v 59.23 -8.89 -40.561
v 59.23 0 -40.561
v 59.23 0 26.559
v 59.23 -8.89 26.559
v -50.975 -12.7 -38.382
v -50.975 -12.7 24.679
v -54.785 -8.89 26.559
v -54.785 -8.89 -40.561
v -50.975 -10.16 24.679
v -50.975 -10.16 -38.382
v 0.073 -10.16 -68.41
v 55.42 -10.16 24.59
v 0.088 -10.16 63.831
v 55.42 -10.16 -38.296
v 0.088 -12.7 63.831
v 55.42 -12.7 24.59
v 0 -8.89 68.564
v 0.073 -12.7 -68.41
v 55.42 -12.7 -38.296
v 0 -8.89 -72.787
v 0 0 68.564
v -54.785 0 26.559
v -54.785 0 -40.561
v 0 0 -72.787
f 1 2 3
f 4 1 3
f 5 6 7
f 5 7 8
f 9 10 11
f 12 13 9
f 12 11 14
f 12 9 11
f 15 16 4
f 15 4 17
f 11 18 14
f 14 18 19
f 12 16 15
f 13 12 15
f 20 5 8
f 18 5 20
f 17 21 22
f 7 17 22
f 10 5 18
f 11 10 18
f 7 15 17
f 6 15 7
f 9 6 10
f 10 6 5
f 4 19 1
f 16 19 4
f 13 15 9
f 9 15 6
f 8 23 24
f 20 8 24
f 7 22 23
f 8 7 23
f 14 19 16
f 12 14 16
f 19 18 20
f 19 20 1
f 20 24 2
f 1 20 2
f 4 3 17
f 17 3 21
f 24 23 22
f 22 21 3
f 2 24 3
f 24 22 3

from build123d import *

# Parameters (mm, degrees)
F1_DEPTH = 12.7
F2_SIZE  = 3.81
F3_DEPTH = 2.54


with BuildPart() as f1:
    # F0 (on Front) → F1 (new body)
    with BuildSketch(Plane.XZ):
        Polygon((59.229627, 26.558874), (0, 68.564124), (-54.784626, 26.558874), (-54.784626, -40.560622), (0, -72.786875), (59.229627, -40.560622), align=None)
    extrude(amount=F1_DEPTH)

    # F2
    f2_edges = [f1.edges().sort_by_distance(p)[0] for p in [
        (59.229627, -12.7, -7.000874),
        (29.614814, -12.7, 47.561499),
        (-27.392313, -12.7, 47.561499),
        (-54.784626, -12.7, -7.000874),
        (-27.392313, -12.7, -56.673748),
        (29.614814, -12.7, -56.673748),
    ]]
    chamfer(f2_edges, length=F2_SIZE)

    # F1_face (on face) → F3 (cut)
    with BuildSketch(Plane(origin=(1.953457, -12.7, -4.300965), x_dir=(1, 0, 0), z_dir=(0, -1, 0))):
        Polygon((53.46617, -33.995203), (53.46617, 28.890993), (-1.865273, 68.131678), (-52.928083, 28.980071), (-52.928083, -34.080543), (-1.880286, -64.108661), align=None)
    extrude(amount=-F3_DEPTH, mode=Mode.SUBTRACT)


solid = f1.part
